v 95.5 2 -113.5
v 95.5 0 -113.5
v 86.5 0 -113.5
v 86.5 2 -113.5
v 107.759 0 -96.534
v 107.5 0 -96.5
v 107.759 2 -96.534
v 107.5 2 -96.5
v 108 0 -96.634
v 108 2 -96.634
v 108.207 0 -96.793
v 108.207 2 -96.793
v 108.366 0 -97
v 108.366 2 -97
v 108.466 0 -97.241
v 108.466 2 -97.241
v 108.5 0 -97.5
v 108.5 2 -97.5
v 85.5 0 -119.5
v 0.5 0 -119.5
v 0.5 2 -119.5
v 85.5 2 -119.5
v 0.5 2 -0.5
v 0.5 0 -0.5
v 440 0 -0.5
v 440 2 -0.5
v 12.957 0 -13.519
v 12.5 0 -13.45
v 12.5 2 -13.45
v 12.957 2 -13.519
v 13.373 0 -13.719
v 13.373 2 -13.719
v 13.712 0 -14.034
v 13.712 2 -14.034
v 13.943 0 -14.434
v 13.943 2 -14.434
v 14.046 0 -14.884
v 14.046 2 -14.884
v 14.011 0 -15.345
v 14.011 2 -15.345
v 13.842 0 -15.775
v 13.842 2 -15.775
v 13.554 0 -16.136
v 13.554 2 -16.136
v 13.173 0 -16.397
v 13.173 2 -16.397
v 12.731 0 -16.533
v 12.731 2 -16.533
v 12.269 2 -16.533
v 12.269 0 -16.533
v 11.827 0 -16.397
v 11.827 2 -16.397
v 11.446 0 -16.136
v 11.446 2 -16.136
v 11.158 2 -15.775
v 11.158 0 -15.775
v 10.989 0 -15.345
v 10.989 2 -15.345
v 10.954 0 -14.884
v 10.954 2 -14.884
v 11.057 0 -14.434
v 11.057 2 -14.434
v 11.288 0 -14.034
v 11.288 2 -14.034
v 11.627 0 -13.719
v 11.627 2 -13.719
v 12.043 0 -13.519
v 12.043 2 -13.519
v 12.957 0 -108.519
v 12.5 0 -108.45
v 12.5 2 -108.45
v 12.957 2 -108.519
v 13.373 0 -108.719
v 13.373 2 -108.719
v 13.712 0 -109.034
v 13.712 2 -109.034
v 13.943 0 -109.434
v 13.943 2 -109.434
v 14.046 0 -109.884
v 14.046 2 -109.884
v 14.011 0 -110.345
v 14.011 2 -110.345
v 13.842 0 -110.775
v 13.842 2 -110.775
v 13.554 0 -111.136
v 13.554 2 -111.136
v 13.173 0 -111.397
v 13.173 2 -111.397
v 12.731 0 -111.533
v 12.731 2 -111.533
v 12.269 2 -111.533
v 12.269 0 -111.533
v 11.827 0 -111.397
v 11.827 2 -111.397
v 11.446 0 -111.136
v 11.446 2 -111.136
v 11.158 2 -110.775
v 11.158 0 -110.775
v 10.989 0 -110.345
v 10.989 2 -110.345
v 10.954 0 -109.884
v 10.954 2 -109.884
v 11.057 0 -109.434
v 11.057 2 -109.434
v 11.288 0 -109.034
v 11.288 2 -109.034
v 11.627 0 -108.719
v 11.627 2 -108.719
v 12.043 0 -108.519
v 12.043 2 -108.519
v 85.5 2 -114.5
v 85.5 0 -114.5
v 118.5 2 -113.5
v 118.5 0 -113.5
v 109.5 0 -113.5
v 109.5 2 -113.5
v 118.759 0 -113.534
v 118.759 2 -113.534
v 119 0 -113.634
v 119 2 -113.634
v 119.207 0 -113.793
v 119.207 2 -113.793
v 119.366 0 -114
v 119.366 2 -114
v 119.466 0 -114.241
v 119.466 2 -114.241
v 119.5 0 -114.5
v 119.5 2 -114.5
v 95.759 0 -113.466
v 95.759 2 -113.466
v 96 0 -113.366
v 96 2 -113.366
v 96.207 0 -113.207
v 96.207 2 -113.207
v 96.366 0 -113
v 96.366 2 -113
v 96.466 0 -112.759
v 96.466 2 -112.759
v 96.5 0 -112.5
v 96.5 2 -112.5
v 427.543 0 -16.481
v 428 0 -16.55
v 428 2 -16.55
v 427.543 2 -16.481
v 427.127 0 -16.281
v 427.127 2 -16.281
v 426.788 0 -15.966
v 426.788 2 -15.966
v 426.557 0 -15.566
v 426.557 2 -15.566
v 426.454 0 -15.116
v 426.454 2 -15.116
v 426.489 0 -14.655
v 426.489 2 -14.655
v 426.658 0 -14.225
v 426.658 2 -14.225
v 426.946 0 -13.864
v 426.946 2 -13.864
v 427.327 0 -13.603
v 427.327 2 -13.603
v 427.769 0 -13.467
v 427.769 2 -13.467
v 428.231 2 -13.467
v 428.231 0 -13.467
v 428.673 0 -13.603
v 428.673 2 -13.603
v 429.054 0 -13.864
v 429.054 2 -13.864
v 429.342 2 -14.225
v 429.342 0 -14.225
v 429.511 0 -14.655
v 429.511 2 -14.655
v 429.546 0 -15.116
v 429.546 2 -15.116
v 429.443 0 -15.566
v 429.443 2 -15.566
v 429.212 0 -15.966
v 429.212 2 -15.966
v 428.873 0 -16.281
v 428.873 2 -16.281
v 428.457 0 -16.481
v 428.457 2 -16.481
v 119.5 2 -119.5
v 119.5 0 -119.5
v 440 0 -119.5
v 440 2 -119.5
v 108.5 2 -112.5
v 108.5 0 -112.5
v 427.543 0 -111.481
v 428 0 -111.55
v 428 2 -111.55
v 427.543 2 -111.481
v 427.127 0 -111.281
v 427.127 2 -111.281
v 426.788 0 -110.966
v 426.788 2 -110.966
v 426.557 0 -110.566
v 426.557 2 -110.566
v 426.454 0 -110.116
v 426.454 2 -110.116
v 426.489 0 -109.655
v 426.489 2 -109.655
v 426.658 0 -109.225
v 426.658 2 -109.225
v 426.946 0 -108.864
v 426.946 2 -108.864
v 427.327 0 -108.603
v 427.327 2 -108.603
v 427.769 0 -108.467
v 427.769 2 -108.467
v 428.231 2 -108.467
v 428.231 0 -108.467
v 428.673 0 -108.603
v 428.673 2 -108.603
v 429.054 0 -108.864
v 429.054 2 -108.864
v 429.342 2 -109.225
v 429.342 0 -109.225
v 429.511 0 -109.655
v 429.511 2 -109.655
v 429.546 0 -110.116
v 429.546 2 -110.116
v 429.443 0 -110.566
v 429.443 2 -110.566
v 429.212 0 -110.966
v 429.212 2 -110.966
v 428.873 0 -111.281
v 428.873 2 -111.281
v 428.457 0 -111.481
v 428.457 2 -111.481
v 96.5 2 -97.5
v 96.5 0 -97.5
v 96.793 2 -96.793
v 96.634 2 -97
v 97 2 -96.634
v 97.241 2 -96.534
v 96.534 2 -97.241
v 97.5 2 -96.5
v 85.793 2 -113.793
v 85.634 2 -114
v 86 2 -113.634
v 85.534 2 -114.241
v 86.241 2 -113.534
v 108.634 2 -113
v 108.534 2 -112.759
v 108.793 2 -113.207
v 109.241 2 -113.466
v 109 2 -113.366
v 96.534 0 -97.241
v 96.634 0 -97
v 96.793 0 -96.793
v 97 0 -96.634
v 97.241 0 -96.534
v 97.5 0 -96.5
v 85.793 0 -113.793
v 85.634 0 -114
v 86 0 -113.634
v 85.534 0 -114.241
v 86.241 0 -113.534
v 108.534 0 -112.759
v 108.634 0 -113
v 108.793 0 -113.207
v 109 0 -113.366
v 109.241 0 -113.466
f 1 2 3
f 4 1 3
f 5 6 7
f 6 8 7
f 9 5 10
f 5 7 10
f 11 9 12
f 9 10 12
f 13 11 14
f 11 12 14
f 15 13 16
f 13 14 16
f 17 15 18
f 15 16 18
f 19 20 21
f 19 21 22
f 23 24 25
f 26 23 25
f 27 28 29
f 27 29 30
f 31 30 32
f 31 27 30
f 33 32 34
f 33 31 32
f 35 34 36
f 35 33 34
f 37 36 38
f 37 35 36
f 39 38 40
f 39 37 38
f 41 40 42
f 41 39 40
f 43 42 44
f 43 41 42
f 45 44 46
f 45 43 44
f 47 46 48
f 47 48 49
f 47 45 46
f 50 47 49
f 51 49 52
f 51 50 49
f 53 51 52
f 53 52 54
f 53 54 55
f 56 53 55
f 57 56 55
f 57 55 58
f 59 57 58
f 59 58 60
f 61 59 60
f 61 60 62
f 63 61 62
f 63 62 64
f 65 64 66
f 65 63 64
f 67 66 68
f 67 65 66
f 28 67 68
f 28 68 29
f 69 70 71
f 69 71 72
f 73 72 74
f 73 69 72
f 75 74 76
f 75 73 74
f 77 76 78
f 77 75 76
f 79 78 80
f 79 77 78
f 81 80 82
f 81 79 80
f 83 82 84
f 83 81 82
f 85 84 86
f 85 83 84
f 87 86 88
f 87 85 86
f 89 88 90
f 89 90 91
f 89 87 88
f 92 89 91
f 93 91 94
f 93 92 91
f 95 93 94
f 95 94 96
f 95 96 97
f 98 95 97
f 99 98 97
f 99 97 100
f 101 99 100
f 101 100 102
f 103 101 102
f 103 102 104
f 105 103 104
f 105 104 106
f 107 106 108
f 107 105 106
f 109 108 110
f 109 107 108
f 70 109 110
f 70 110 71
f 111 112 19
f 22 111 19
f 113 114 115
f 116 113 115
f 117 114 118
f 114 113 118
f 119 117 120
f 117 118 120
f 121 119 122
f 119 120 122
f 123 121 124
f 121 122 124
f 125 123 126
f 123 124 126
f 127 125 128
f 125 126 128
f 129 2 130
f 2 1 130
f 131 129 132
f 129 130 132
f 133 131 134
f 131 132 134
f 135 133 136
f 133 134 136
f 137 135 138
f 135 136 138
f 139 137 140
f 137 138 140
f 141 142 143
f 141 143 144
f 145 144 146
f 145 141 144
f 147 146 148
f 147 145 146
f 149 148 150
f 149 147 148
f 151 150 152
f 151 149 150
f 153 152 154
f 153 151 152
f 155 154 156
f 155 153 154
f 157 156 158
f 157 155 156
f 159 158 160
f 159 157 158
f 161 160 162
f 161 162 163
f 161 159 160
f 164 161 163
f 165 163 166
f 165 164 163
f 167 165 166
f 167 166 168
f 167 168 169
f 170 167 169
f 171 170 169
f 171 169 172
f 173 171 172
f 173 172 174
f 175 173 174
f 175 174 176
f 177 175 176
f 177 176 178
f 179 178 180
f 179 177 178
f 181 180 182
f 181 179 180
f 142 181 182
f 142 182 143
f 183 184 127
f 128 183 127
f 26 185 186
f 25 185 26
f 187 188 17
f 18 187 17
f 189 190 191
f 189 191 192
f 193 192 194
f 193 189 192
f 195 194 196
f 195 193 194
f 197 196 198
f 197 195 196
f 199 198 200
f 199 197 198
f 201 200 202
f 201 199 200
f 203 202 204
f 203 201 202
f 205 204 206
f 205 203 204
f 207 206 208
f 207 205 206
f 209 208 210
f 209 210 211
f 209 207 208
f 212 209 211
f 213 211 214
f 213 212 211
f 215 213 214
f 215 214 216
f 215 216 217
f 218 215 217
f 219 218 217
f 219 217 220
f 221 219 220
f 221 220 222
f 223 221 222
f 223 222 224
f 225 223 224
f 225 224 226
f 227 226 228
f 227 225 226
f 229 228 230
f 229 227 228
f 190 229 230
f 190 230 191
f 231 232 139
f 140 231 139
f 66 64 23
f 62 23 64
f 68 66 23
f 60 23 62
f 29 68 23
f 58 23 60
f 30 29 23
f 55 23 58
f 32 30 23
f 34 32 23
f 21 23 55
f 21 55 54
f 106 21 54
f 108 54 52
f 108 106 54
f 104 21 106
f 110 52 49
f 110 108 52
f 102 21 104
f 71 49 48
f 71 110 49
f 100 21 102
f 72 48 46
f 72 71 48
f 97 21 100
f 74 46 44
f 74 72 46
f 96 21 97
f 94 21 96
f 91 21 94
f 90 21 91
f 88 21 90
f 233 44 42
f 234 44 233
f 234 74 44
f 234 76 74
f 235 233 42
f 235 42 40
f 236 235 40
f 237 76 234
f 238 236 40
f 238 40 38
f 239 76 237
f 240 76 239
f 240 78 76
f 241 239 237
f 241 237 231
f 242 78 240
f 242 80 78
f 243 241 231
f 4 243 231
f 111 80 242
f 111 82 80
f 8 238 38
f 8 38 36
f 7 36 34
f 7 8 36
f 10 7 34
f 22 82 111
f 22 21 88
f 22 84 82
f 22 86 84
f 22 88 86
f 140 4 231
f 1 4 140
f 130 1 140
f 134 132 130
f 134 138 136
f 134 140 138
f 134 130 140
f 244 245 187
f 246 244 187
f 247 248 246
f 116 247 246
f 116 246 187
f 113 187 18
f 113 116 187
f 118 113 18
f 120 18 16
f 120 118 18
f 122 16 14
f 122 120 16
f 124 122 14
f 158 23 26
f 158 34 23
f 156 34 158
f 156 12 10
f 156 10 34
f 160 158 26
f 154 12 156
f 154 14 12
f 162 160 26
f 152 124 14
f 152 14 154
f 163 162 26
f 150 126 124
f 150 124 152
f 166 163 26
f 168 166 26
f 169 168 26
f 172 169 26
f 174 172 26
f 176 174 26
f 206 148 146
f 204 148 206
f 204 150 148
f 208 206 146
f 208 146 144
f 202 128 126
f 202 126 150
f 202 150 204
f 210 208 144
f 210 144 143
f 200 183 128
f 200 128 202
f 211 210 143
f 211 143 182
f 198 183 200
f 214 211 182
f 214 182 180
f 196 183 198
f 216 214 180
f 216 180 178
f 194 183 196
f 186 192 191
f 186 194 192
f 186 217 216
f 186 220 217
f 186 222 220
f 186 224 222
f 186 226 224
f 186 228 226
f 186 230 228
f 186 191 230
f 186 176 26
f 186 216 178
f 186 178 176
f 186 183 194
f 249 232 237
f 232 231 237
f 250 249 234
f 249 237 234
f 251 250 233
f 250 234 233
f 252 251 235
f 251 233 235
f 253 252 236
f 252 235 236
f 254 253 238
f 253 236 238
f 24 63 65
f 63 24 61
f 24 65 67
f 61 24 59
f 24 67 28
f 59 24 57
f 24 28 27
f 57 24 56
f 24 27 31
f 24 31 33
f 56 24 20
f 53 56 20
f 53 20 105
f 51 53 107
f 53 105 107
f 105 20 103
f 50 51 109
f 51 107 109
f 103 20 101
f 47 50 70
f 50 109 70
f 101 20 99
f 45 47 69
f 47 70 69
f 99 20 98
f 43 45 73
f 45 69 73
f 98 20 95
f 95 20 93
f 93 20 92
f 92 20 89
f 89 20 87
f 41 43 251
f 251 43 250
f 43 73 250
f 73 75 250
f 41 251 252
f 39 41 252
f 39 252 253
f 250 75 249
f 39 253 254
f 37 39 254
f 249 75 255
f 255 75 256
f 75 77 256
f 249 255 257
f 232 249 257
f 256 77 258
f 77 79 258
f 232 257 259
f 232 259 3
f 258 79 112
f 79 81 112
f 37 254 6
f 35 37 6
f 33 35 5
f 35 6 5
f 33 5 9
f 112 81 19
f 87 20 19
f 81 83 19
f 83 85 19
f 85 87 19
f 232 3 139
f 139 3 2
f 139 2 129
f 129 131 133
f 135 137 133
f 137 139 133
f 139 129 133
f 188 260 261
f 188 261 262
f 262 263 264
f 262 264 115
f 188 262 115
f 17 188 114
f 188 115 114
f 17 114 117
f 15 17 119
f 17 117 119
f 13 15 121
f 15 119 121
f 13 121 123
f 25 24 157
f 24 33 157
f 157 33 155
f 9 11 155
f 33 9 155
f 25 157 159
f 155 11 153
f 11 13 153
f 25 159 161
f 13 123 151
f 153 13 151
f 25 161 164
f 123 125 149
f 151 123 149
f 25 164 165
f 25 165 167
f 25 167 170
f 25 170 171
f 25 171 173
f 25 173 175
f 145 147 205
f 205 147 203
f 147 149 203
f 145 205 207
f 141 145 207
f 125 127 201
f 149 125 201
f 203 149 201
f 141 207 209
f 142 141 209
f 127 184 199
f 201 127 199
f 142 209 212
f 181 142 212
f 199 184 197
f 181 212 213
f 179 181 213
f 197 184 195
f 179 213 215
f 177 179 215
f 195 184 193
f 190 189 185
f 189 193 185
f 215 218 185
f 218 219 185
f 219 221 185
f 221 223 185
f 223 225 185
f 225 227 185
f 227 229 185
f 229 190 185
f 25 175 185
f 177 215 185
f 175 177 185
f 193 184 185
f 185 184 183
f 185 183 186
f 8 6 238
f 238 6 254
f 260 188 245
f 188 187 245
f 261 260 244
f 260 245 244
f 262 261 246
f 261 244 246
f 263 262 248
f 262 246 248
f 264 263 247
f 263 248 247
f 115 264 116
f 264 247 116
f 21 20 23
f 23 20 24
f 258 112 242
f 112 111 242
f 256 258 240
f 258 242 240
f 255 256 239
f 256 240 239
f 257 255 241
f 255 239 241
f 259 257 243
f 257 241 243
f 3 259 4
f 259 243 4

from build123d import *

# Parameters (mm, degrees)
CROQUIS1_W              = 440.5
CROQUIS1_H              = 120
CROQUIS1_R              = 1.55
SALIENTE_EXTRUIR1_DEPTH = 2
CROQUIS2_W              = 440.5
CROQUIS2_H              = 120
CROQUIS2_W_2            = 439.5
CROQUIS2_H_2            = 119
CORTAR_EXTRUIR1_DEPTH   = 2
CORTAR_EXTRUIR2_DEPTH   = 2
REDONDEO1_R             = 1


with BuildPart() as part:
    # Croquis1 → Saliente-Extruir1 (new body)
    with BuildSketch(Plane(origin=(0, 0, 0), x_dir=(1, 0, 0), z_dir=(0, 1, 0))):
        with Locations((220.25, 60)):
            Rectangle(CROQUIS1_W, CROQUIS1_H)
        with Locations(Location((12.5, 15, 0), (0, 0, 270))):
            Circle(CROQUIS1_R, mode=Mode.SUBTRACT)
        with Locations(Location((12.5, 110, 0), (0, 0, 270))):
            Circle(CROQUIS1_R, mode=Mode.SUBTRACT)
        with Locations(Location((428, 15, 0), (0, 0, 90))):
            Circle(CROQUIS1_R, mode=Mode.SUBTRACT)
        with Locations(Location((428, 110, 0), (0, 0, 90))):
            Circle(CROQUIS1_R, mode=Mode.SUBTRACT)
    extrude(amount=SALIENTE_EXTRUIR1_DEPTH)

    # Croquis2 → Cortar-Extruir1 (cut)
    with BuildSketch(Plane.XZ):
        with Locations((220.25, -60)):
            Rectangle(CROQUIS2_W, CROQUIS2_H)
        with Locations((220.25, -60)):
            Rectangle(CROQUIS2_W_2, CROQUIS2_H_2, mode=Mode.SUBTRACT)
    extrude(amount=-CORTAR_EXTRUIR1_DEPTH, mode=Mode.SUBTRACT)

    # Croquis3 → Cortar-Extruir2 (cut)
    with BuildSketch(Plane.XZ):
        Polygon((85.5, -119.5), (119.5, -119.5), (119.5, -113.5), (108.5, -113.5), (108.5, -96.5), (96.5, -96.5), (96.5, -113.5), (85.5, -113.5), align=None)
    extrude(amount=-CORTAR_EXTRUIR2_DEPTH, mode=Mode.SUBTRACT)

    # Redondeo1
    redondeo1_edges = [part.edges().sort_by_distance(p)[0] for p in [
        (85.5, 1, -113.5),
        (96.5, 1, -113.5),
        (96.5, 1, -96.5),
        (108.5, 1, -96.5),
        (108.5, 1, -113.5),
        (119.5, 1, -113.5),
    ]]
    fillet(redondeo1_edges, radius=REDONDEO1_R)


solid = part.part
